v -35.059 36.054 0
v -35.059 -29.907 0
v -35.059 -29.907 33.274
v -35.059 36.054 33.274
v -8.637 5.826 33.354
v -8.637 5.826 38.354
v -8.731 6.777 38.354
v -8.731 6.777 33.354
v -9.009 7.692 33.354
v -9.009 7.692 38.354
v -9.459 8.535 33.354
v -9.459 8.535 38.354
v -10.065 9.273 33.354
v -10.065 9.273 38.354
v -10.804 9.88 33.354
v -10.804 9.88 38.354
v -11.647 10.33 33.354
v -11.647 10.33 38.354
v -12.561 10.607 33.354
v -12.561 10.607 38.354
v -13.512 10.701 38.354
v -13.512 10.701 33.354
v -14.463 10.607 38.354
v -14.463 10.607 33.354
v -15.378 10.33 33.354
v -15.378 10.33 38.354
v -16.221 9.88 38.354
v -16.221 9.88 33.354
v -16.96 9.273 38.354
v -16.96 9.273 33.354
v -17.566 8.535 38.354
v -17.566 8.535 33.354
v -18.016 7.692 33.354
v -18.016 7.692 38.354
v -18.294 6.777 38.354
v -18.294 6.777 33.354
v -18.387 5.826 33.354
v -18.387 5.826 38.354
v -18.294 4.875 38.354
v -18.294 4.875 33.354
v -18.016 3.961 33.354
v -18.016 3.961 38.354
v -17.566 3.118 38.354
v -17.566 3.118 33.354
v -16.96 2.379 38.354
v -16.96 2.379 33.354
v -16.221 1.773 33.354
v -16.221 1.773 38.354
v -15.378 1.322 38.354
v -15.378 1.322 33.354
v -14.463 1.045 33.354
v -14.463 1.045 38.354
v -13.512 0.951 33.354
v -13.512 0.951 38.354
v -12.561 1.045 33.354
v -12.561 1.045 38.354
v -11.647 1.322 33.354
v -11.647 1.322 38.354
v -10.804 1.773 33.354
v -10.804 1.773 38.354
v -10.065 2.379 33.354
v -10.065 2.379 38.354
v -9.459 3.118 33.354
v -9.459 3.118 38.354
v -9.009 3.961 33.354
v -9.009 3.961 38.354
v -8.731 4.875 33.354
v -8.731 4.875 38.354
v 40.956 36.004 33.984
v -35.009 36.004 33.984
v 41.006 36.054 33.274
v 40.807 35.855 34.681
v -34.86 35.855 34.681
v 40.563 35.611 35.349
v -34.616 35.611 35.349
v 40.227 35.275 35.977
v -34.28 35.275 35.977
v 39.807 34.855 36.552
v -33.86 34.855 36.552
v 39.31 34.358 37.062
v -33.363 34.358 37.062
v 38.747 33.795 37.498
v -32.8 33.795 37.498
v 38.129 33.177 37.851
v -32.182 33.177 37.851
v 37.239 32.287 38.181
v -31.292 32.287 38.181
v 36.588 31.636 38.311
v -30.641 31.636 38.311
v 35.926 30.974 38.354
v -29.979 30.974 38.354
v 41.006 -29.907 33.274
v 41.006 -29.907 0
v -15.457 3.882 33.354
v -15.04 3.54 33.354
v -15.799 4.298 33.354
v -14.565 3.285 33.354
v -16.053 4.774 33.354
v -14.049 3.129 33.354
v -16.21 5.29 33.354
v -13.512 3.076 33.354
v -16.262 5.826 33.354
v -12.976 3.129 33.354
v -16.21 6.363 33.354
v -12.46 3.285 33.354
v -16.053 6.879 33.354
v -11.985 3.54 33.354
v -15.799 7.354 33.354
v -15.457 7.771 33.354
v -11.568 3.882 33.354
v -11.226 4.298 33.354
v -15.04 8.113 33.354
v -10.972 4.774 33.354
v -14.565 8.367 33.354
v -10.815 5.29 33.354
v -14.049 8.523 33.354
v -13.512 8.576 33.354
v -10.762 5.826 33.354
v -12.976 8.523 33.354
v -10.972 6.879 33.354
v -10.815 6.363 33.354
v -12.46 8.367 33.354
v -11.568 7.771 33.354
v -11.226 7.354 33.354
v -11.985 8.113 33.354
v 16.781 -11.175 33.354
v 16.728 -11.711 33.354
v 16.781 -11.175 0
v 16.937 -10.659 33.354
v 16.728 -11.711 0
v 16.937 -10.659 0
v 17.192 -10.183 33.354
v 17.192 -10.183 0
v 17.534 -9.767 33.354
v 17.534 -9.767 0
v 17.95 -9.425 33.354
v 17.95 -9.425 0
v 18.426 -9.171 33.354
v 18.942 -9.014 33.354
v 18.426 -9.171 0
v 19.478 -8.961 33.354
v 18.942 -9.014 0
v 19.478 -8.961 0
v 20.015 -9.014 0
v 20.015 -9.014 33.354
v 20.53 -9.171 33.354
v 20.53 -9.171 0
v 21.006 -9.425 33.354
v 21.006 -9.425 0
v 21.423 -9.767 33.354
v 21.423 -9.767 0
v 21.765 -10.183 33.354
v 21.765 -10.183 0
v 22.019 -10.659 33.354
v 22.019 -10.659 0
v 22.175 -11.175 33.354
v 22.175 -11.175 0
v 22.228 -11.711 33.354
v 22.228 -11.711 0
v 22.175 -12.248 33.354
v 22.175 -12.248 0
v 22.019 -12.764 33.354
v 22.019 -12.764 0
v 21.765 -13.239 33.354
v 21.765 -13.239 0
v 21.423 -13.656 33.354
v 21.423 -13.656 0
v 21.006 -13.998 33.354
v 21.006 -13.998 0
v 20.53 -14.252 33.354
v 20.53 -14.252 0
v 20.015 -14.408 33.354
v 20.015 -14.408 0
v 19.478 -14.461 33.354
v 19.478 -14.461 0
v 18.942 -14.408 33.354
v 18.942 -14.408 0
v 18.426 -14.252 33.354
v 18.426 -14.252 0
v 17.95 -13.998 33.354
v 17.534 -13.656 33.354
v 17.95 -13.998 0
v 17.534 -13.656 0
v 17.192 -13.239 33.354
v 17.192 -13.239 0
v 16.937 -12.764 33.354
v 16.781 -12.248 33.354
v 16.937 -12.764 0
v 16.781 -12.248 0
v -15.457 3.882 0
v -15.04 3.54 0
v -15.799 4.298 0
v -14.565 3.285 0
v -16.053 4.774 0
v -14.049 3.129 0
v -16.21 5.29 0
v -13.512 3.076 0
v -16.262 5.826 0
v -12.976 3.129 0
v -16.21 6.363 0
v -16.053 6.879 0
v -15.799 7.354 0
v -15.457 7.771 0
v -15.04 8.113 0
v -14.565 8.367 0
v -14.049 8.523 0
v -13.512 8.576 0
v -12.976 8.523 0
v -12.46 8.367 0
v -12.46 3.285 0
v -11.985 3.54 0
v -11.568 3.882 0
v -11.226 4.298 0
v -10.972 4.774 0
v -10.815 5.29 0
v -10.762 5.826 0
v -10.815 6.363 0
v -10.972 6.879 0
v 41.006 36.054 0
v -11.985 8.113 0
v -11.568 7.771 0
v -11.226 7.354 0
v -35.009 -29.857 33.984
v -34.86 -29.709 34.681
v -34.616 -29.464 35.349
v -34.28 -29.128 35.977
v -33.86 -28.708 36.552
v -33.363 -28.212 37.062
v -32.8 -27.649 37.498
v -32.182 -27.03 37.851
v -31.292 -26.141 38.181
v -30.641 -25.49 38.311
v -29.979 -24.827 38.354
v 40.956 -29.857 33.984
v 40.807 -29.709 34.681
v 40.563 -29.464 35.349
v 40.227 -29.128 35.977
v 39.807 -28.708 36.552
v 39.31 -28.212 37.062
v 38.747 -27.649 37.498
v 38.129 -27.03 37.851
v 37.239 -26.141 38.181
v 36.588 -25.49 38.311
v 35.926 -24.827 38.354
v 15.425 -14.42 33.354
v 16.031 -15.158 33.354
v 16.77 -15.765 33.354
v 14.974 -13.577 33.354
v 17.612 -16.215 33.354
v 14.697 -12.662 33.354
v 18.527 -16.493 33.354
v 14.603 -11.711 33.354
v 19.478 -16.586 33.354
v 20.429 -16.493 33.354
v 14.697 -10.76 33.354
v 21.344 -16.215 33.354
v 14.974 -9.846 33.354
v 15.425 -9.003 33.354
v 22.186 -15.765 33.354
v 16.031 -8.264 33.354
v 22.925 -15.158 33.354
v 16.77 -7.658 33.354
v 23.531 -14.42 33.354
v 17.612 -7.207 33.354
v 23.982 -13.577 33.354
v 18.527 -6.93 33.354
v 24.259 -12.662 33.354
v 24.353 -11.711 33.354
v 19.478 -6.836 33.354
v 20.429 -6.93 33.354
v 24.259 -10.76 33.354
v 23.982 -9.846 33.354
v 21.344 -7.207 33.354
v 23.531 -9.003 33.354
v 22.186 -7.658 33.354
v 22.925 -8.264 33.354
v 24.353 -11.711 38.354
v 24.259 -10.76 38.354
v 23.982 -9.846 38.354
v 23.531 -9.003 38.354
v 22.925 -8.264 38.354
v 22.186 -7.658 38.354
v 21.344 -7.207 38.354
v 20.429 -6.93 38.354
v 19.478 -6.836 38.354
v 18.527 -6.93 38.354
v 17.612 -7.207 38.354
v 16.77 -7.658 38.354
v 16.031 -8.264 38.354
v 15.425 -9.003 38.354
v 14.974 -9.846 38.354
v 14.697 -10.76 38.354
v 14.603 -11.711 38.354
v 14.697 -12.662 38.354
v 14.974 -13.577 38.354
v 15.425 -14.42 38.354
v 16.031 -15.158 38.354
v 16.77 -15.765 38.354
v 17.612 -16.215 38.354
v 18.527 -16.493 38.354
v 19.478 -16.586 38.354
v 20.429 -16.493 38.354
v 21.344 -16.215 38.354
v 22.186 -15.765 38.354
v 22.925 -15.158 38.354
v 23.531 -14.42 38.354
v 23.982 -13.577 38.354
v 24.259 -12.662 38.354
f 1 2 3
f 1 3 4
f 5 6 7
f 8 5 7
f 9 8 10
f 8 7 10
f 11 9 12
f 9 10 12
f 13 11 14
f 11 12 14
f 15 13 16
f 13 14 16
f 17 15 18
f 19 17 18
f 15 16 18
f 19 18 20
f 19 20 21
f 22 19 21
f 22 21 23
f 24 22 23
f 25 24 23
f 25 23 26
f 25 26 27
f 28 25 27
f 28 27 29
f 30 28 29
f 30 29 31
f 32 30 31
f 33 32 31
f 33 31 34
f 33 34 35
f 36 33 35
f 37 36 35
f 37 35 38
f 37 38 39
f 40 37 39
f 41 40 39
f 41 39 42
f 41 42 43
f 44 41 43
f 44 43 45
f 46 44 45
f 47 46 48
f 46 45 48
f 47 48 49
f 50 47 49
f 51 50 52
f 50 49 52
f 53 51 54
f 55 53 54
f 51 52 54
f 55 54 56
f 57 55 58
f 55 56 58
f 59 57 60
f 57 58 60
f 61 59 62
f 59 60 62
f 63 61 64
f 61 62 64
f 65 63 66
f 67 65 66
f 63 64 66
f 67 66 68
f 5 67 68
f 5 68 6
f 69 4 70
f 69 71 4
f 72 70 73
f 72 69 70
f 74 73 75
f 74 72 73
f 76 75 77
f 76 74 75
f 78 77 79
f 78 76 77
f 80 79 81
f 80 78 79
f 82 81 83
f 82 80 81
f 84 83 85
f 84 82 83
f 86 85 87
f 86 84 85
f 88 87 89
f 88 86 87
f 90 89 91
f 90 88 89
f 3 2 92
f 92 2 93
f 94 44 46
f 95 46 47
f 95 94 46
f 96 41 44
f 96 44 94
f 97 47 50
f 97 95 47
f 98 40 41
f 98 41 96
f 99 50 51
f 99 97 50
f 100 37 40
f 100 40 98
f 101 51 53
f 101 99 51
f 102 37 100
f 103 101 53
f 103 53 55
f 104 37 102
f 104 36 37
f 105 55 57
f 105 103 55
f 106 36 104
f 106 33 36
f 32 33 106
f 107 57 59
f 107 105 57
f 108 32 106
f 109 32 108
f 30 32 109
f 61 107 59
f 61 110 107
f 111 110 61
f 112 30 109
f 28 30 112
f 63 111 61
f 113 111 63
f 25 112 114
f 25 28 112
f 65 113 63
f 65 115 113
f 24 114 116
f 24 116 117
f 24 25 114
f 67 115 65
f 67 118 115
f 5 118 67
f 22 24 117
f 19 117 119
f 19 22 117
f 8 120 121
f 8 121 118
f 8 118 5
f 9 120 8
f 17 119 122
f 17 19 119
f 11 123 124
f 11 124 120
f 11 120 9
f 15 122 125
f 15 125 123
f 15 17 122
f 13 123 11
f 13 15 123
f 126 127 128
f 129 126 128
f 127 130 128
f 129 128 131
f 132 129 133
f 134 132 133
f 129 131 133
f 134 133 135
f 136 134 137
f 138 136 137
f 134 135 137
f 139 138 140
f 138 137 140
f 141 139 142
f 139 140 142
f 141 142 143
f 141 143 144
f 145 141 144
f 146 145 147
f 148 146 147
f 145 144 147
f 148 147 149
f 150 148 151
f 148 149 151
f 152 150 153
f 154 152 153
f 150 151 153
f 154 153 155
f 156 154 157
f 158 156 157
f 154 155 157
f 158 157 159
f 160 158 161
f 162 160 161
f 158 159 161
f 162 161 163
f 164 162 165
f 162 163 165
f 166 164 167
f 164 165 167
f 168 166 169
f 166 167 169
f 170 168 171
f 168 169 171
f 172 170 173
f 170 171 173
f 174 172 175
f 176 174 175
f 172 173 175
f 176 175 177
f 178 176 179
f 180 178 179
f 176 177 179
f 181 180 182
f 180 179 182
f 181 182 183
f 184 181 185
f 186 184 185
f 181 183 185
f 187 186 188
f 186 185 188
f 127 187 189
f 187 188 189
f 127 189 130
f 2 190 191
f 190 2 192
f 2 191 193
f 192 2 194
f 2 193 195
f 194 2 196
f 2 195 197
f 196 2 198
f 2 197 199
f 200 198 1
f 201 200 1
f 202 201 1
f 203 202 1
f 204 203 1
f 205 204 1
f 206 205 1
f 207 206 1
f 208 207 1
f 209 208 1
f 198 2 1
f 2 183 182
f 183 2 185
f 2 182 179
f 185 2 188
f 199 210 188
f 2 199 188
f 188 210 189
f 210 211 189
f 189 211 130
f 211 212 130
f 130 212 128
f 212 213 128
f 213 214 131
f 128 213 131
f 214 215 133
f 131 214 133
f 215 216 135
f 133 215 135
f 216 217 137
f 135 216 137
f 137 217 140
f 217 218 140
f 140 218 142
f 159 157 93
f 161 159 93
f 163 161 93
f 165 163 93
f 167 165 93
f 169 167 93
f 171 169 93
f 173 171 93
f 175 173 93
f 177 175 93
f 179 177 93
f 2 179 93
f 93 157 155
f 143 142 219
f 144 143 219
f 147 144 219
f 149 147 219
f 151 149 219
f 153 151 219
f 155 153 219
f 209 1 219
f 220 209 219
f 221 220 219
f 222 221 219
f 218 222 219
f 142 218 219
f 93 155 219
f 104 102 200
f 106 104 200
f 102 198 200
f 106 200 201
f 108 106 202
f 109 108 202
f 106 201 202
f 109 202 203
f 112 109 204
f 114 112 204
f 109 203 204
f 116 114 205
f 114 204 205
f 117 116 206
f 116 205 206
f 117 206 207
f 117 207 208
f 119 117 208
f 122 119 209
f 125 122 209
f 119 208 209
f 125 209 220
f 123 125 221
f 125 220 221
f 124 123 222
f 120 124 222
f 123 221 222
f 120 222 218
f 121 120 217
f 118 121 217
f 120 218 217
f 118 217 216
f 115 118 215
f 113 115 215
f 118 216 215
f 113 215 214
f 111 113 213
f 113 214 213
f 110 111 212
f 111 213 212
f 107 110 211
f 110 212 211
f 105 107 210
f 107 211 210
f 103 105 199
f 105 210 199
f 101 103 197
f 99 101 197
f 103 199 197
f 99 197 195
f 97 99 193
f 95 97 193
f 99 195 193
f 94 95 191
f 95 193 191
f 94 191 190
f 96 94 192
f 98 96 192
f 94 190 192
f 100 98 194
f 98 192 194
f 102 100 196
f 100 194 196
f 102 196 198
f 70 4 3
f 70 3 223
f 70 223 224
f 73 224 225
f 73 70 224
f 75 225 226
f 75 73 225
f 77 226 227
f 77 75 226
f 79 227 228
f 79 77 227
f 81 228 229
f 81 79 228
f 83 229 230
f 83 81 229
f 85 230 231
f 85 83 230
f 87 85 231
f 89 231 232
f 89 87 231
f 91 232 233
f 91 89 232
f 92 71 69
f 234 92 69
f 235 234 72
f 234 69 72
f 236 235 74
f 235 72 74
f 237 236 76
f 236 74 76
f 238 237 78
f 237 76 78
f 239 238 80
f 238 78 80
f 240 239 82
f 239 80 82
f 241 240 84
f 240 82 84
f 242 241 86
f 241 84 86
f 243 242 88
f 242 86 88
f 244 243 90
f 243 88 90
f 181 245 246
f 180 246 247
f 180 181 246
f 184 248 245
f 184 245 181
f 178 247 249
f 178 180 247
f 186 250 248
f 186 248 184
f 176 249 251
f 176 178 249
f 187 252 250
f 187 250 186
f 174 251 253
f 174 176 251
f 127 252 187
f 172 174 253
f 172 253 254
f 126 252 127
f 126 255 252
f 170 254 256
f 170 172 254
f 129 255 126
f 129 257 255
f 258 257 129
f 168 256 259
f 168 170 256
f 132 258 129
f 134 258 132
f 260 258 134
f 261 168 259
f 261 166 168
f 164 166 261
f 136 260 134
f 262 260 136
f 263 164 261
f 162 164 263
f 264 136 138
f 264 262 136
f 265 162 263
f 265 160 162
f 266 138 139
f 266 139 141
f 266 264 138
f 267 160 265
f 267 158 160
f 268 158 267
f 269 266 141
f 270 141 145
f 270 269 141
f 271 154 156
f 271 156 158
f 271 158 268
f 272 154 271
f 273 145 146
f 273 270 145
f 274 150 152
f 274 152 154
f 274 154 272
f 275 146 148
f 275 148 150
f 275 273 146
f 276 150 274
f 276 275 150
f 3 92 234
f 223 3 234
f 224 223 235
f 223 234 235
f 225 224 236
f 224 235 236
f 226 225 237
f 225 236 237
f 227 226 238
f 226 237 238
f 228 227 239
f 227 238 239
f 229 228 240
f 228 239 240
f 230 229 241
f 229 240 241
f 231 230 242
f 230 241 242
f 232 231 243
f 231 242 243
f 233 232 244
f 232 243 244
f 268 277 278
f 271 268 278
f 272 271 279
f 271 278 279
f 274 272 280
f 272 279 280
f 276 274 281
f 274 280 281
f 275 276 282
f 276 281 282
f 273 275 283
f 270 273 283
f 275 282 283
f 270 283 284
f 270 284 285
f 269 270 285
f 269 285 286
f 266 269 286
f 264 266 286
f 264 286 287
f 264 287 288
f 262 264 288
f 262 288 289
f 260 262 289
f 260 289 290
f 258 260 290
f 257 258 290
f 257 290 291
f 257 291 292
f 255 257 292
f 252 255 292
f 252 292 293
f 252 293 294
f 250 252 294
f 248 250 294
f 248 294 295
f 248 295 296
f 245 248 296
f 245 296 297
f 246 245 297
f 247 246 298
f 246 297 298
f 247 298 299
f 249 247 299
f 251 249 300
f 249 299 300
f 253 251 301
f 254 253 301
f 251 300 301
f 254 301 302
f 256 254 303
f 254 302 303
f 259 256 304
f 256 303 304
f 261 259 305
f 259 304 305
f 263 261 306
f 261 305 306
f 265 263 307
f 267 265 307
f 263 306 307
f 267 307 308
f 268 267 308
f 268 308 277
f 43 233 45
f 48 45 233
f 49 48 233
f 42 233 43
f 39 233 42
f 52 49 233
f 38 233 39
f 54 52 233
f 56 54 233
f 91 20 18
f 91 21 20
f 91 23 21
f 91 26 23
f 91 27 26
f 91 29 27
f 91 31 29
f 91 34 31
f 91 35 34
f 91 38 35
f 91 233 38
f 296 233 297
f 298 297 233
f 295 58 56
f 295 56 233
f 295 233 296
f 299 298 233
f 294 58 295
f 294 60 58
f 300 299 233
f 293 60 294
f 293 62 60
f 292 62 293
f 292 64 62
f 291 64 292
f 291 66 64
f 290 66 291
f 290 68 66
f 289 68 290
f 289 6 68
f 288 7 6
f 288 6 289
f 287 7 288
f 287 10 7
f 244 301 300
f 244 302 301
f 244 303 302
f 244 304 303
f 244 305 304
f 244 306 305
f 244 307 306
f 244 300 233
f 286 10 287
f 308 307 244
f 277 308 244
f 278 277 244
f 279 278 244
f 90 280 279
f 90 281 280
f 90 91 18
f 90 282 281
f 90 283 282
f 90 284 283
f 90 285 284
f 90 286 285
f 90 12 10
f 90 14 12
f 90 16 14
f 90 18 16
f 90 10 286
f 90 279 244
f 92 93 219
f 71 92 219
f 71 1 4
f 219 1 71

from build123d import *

# Parameters (mm, degrees)
F0_W           = 76.0650336742
F0_H           = 65.9612175077
F1_DEPTH       = 38.354
F2_R           = 5.08
F4_D           = 5.5
F4_CBORE_D     = 9.75
F4_CBORE_DEPTH = 5


with BuildPart() as f1:
    # F0 (on Top) → F1 (new body)
    with BuildSketch(Plane.XY):
        with Locations((2.9734522104, 3.0732313171)):
            Rectangle(F0_W, F0_H)
    extrude(amount=F1_DEPTH)

    # F2
    f2_edges = [f1.edges().sort_by_distance(p)[0] for p in [
        (2.973452, -29.907377, 38.354),
        (41.005969, 3.073231, 38.354),
        (2.973452, 36.05384, 38.354),
        (-35.059065, 3.073231, 38.354),
    ]]
    fillet(f2_edges, radius=F2_R)

    # F4 (through all)
    with Locations(Plane.XY.offset(38.354)):
        with Locations((-13.5124307126, 5.8261519298), (19.4780696183, -11.7112351581)):
            CounterBoreHole(F4_D / 2, F4_CBORE_D / 2, F4_CBORE_DEPTH)


solid = f1.part
